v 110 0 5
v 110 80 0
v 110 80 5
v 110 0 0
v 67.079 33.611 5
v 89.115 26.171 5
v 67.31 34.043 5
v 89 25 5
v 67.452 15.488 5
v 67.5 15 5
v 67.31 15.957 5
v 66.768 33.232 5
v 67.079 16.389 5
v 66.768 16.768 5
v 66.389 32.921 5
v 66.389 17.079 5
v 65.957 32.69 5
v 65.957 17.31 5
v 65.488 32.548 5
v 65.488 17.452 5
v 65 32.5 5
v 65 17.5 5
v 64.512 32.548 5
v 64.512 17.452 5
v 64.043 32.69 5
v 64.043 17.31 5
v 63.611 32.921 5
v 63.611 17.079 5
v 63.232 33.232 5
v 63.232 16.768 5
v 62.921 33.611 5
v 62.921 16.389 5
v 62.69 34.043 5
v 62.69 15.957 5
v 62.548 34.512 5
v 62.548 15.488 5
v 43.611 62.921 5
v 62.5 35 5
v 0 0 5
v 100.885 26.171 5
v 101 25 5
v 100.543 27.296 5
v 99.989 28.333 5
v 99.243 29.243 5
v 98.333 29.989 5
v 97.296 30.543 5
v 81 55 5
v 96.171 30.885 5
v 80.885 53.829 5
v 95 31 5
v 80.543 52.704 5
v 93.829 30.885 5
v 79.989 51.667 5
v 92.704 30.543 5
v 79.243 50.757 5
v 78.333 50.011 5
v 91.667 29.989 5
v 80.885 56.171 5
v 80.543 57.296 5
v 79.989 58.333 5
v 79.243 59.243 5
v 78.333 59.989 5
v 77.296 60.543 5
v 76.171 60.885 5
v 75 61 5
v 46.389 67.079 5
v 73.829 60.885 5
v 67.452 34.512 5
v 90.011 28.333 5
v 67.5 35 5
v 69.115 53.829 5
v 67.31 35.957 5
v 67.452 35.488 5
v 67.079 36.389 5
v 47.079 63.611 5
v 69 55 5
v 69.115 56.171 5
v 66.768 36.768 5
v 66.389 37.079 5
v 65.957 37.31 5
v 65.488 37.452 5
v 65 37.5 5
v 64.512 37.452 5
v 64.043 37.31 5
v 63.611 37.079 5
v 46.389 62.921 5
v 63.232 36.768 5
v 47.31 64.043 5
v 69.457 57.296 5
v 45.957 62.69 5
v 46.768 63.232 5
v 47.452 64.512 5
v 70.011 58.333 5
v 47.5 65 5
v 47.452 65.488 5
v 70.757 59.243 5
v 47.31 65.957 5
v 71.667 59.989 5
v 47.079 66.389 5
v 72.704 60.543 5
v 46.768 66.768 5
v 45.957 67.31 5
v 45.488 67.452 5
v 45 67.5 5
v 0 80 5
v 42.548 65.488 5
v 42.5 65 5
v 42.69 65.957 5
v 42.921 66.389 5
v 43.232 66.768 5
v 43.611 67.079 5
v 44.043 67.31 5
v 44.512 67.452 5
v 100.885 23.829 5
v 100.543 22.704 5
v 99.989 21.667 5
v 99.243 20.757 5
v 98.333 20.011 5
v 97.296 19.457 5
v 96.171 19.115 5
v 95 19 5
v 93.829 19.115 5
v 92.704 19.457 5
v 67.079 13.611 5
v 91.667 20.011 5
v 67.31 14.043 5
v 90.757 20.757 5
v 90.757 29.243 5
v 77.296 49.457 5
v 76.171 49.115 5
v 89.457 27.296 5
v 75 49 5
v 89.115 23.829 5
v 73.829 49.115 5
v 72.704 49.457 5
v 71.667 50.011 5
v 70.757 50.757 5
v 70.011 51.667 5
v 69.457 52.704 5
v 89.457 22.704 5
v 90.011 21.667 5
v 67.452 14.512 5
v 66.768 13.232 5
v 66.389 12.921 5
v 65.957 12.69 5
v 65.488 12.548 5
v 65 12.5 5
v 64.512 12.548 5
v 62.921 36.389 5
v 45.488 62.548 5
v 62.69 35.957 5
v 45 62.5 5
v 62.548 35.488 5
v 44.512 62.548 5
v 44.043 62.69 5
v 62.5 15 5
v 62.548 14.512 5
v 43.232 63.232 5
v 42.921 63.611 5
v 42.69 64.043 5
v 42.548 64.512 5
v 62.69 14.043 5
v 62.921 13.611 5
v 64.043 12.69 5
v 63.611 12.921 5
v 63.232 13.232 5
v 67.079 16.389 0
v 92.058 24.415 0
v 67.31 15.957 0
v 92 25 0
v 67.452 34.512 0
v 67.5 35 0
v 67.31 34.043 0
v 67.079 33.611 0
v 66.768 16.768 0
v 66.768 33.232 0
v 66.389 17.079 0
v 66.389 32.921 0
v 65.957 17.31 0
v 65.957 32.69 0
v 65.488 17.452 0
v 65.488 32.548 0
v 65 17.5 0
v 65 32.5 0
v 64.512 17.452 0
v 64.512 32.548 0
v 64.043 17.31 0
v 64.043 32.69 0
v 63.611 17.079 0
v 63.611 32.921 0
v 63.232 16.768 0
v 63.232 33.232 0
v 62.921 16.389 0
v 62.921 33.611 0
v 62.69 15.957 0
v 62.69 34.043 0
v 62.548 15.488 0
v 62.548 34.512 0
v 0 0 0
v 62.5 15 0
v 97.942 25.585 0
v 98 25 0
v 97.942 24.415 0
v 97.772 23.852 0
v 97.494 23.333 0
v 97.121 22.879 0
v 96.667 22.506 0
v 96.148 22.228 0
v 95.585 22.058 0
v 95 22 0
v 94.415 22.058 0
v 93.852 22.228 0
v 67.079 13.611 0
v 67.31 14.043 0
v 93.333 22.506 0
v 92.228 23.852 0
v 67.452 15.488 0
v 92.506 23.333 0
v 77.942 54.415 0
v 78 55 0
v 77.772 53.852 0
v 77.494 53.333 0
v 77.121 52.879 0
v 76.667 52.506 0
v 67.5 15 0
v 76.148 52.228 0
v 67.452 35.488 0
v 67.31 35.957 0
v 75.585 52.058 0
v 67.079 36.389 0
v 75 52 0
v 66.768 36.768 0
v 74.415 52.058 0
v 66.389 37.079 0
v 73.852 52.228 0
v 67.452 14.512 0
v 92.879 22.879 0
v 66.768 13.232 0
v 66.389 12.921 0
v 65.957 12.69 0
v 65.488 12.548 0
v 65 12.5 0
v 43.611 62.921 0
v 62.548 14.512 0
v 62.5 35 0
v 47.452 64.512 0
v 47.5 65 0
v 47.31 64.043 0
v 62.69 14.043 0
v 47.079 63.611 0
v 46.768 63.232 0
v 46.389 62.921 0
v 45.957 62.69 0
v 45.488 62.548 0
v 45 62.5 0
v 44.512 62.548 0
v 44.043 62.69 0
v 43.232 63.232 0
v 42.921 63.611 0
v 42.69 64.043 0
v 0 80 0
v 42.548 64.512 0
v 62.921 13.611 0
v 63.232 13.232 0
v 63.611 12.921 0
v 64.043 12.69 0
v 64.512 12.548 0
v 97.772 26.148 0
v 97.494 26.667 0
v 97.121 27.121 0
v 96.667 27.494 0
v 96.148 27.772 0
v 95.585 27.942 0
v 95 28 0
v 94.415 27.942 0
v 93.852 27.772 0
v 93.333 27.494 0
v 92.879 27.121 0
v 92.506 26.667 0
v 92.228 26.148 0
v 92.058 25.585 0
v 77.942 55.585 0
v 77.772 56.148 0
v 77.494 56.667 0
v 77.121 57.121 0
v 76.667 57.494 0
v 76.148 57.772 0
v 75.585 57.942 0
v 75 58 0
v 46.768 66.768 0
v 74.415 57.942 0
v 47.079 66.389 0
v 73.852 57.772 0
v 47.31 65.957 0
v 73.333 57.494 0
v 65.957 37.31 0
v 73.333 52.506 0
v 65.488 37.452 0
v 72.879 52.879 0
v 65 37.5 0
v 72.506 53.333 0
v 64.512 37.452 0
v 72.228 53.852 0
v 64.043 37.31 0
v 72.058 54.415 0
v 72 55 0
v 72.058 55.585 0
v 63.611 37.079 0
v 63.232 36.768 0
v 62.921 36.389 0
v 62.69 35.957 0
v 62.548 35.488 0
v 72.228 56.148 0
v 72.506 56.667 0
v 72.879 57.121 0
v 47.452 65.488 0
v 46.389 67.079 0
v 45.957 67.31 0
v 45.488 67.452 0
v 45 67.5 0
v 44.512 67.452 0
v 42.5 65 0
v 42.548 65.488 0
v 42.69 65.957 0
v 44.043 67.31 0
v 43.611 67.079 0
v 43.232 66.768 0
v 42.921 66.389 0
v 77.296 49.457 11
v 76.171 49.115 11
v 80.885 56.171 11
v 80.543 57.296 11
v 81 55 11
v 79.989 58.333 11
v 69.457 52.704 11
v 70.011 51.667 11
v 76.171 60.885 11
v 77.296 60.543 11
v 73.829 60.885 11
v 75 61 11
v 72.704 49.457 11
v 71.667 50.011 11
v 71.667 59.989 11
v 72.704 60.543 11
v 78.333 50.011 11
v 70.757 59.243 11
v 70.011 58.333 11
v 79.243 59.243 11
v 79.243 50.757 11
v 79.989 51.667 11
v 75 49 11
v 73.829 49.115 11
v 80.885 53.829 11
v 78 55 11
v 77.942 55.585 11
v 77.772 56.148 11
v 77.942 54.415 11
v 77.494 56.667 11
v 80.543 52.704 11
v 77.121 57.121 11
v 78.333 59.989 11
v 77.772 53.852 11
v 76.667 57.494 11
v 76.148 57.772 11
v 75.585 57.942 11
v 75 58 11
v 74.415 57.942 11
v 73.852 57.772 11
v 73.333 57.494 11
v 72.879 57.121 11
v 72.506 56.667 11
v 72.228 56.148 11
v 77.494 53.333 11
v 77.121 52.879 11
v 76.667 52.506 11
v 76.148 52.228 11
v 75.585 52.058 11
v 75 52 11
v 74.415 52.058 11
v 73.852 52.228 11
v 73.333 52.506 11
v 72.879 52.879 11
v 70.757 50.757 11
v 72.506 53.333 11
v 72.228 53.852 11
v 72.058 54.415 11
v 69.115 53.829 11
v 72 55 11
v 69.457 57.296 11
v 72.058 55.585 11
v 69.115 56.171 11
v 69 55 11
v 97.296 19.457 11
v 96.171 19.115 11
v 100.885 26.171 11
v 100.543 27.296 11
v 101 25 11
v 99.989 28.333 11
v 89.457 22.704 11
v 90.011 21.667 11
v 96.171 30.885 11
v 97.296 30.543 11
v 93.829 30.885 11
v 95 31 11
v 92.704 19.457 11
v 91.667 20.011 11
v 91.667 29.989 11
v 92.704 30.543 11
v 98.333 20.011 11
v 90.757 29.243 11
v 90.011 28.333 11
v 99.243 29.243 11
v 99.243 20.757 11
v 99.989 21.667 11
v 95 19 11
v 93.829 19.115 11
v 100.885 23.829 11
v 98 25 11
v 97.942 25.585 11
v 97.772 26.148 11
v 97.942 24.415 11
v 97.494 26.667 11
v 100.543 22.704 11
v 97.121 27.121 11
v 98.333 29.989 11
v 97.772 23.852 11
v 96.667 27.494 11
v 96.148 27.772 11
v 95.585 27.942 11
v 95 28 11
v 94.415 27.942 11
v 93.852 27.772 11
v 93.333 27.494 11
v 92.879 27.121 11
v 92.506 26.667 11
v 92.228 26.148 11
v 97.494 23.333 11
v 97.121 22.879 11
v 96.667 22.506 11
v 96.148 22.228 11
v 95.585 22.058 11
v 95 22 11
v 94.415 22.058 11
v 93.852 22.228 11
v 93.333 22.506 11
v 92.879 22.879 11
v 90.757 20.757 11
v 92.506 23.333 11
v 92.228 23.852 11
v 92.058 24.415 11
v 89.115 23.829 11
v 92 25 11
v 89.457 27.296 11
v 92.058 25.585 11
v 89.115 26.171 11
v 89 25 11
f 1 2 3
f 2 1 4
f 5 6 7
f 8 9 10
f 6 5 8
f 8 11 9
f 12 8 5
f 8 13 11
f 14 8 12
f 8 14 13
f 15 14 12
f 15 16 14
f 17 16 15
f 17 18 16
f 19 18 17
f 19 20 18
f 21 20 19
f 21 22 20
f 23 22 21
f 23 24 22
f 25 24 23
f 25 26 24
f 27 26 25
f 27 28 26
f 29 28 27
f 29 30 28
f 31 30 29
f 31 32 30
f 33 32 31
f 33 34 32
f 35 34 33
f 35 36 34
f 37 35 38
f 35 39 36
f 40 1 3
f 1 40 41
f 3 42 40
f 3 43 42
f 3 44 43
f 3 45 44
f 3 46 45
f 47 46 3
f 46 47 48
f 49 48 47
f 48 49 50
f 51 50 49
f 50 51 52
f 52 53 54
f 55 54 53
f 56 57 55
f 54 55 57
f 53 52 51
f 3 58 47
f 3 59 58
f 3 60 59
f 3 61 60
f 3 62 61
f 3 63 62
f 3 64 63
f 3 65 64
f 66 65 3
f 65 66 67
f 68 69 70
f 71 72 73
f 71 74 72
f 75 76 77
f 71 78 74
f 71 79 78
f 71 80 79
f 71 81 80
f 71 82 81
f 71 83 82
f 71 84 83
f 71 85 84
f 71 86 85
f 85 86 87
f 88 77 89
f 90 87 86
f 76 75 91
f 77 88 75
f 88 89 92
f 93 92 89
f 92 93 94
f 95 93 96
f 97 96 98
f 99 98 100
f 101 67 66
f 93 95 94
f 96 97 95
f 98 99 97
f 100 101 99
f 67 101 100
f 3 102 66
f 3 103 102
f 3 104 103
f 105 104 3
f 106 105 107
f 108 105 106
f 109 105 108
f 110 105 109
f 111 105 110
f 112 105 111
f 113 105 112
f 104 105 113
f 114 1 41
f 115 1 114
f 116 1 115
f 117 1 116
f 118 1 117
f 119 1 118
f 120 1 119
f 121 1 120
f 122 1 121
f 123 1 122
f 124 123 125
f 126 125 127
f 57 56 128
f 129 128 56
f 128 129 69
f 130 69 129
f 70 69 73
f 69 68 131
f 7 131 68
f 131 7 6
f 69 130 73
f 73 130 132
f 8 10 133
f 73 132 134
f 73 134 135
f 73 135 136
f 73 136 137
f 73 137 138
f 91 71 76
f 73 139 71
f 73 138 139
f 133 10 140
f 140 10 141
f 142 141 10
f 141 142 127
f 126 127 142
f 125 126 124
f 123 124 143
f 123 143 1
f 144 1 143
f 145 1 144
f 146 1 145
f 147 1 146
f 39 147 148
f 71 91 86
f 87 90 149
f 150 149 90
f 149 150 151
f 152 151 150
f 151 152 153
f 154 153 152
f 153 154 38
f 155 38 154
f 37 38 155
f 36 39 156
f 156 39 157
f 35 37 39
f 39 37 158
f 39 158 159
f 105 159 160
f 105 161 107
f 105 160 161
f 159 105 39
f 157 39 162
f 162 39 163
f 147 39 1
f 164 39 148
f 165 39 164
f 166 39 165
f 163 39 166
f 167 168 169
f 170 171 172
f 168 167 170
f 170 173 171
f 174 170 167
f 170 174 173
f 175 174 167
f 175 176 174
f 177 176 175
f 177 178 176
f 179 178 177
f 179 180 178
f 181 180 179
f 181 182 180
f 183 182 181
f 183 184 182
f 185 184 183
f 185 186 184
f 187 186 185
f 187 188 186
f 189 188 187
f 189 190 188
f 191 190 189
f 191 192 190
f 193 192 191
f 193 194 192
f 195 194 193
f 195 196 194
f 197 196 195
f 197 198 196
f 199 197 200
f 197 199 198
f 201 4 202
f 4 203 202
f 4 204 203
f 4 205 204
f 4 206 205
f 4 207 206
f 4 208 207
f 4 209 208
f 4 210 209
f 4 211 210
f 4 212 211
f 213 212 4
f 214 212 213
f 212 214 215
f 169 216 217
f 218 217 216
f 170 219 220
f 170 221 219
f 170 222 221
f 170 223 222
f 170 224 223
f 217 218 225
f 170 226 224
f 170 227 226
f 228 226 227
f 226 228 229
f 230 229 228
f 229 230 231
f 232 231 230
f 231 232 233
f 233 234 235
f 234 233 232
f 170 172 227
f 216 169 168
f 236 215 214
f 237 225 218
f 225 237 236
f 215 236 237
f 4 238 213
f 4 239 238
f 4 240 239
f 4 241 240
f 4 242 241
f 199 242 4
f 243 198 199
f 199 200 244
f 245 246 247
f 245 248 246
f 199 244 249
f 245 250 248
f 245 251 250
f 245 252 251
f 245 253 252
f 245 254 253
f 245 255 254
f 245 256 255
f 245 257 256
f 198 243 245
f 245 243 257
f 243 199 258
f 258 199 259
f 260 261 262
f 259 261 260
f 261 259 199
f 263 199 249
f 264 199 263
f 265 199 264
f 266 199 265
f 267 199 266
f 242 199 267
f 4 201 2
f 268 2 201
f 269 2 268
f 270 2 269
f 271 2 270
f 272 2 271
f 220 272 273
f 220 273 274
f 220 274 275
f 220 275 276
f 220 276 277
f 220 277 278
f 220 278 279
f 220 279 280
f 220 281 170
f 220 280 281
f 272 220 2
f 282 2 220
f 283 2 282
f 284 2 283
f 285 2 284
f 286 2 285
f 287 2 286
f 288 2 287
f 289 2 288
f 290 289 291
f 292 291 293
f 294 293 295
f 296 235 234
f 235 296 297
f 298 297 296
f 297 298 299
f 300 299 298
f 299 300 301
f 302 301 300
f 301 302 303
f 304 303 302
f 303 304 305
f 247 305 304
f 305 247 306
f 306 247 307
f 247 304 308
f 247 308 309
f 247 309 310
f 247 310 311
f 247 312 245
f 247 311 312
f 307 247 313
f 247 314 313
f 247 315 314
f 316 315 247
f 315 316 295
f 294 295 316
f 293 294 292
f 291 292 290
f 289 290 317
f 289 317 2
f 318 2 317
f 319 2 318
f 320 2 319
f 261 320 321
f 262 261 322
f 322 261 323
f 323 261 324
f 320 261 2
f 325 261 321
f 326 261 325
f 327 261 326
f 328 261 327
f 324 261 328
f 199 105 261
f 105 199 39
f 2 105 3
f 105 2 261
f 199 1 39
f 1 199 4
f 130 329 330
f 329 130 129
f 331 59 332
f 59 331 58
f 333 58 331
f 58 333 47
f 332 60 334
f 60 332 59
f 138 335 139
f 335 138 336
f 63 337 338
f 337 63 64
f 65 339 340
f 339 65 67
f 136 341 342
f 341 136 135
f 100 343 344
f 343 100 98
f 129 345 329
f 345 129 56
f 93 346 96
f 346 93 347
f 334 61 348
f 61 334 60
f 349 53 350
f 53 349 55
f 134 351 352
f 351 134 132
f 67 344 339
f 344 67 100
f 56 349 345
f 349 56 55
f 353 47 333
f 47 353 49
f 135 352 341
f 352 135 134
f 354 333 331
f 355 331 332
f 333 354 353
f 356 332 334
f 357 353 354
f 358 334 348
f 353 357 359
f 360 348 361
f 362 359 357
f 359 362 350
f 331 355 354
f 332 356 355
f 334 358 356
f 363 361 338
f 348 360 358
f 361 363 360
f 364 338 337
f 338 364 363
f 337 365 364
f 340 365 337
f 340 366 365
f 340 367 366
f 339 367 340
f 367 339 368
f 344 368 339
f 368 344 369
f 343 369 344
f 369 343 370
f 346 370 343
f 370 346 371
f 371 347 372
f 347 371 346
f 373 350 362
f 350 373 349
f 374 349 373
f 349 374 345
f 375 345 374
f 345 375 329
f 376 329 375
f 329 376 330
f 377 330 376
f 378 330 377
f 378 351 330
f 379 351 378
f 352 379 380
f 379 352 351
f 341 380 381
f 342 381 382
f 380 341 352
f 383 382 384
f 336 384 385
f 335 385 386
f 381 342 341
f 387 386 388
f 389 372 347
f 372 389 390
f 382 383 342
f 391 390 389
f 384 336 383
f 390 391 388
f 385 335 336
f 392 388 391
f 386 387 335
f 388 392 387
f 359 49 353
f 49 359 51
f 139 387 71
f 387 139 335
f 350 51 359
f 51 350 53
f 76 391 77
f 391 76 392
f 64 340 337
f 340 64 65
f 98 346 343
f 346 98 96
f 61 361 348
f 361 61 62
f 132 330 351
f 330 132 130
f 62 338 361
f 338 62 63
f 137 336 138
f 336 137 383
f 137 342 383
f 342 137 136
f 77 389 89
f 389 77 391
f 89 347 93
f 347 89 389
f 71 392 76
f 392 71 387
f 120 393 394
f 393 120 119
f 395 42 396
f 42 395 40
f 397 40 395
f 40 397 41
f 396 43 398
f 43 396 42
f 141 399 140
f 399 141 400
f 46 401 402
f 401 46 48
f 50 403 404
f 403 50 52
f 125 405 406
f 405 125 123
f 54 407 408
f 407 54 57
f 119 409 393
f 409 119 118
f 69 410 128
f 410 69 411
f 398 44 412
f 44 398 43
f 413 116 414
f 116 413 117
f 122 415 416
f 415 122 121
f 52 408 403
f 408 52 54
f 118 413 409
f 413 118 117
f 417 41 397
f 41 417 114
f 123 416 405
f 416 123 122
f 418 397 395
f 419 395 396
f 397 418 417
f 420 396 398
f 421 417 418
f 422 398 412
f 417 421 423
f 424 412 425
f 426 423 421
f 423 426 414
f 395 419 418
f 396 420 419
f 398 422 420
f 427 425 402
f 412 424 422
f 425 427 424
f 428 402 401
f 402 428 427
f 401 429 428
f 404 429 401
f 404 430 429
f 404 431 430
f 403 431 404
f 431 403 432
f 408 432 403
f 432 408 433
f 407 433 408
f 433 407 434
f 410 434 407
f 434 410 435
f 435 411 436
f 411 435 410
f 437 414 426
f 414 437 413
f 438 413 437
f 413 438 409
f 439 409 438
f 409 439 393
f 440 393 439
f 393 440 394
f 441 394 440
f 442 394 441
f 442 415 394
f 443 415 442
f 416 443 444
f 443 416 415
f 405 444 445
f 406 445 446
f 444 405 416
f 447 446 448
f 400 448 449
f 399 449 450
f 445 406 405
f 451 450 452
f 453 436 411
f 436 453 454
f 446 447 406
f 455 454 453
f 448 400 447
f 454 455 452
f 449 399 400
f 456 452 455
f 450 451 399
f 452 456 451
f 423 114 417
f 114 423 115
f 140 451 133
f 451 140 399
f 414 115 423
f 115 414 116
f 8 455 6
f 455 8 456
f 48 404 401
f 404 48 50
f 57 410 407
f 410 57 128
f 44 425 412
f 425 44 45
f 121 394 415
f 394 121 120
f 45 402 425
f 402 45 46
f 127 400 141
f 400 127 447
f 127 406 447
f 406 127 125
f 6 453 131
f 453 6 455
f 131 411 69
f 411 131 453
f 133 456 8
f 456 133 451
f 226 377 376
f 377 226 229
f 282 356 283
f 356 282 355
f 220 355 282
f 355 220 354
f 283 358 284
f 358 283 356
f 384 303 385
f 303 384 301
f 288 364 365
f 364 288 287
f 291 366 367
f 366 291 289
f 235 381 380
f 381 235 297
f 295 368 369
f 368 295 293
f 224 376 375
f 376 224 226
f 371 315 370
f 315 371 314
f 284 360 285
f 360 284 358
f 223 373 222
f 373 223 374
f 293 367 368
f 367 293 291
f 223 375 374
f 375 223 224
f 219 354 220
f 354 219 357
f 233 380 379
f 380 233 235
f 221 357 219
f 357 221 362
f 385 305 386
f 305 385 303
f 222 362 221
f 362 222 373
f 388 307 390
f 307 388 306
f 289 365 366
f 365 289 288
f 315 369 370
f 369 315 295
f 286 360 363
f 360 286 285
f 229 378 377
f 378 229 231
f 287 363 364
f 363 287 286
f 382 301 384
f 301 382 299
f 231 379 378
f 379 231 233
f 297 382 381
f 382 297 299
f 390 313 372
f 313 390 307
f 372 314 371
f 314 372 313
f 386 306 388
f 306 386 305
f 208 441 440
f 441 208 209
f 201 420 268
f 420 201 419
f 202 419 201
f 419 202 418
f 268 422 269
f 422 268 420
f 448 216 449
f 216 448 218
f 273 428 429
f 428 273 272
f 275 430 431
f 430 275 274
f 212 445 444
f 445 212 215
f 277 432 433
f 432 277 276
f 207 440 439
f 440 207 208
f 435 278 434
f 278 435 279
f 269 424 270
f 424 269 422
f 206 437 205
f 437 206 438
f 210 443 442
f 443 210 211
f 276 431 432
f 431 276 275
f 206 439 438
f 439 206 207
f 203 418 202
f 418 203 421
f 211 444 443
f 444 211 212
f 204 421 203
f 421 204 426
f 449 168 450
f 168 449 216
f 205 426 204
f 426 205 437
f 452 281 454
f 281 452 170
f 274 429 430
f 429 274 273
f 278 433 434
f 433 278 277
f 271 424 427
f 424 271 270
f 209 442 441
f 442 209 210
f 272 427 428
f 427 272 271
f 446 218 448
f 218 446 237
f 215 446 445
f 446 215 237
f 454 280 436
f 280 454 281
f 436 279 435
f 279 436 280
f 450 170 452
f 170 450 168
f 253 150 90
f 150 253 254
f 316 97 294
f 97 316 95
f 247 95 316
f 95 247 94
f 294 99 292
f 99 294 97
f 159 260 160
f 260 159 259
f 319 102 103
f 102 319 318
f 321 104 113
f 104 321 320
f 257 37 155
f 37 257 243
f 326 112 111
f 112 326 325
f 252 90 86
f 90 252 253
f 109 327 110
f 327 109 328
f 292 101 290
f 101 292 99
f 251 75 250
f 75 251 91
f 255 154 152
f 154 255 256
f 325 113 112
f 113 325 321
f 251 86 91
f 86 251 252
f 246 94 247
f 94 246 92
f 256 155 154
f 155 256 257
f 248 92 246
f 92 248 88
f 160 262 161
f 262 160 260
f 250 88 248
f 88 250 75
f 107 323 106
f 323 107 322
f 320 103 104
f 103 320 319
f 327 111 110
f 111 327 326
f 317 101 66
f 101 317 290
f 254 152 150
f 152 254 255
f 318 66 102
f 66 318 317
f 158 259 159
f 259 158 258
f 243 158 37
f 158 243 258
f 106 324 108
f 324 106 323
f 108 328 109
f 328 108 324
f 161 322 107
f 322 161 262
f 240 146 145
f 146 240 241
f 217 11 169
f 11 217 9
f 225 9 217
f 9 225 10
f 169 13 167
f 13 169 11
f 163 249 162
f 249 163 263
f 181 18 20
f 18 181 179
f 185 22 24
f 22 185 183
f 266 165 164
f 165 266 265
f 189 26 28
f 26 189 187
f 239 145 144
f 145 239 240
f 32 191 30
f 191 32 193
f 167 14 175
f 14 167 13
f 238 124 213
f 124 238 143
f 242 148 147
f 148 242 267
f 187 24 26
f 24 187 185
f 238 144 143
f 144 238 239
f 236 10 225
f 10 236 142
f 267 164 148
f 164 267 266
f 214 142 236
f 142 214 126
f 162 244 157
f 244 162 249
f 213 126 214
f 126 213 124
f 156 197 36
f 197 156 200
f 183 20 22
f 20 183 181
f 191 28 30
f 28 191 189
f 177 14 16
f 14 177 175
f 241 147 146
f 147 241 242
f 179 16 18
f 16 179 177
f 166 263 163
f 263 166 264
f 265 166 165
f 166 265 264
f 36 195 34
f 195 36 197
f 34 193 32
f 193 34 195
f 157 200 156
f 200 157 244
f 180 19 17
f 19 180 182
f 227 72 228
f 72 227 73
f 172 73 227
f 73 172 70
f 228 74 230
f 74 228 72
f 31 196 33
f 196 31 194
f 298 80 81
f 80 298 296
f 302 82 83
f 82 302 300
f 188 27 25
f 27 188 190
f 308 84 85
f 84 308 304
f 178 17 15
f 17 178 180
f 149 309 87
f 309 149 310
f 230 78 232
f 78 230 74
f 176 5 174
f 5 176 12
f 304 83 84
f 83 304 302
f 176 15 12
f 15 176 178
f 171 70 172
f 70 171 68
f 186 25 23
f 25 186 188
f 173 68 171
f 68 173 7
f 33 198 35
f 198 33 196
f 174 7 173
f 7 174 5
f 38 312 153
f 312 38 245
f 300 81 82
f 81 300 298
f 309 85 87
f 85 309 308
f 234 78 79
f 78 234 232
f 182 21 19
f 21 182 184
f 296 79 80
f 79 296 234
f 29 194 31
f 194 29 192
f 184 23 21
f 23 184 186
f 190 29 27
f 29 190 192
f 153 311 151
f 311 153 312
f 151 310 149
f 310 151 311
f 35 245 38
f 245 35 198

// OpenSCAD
$fn = 32;

// ----------------------------------------------------------------------
// Mixed field: bosses and holes at given coordinates
// ----------------------------------------------------------------------

// --- parameters (mm) ---
plate_l = 110;            // plate length, X
plate_w = 80;             // plate width, Y
plate_t = 5;              // plate thickness, Z
boss_d = 12;              // boss diameter
boss_h = 6;               // boss height above the plate
hole_d = 5;               // through hole diameter

total_h = plate_t + boss_h;  // overall height

difference() {
  union() {
    cube([plate_l, plate_w, plate_t]);
    translate([75, 55, plate_t]) cylinder(h = boss_h, d = boss_d);
    translate([95, 25, plate_t]) cylinder(h = boss_h, d = boss_d);
  }
  translate([75, 55, -1]) cylinder(h = total_h + 2, d = boss_d / 2);
  translate([95, 25, -1]) cylinder(h = total_h + 2, d = boss_d / 2);
  translate([45, 65, -1]) cylinder(h = plate_t + 2, d = hole_d);
  translate([65, 15, -1]) cylinder(h = plate_t + 2, d = hole_d);
  translate([65, 35, -1]) cylinder(h = plate_t + 2, d = hole_d);
}
